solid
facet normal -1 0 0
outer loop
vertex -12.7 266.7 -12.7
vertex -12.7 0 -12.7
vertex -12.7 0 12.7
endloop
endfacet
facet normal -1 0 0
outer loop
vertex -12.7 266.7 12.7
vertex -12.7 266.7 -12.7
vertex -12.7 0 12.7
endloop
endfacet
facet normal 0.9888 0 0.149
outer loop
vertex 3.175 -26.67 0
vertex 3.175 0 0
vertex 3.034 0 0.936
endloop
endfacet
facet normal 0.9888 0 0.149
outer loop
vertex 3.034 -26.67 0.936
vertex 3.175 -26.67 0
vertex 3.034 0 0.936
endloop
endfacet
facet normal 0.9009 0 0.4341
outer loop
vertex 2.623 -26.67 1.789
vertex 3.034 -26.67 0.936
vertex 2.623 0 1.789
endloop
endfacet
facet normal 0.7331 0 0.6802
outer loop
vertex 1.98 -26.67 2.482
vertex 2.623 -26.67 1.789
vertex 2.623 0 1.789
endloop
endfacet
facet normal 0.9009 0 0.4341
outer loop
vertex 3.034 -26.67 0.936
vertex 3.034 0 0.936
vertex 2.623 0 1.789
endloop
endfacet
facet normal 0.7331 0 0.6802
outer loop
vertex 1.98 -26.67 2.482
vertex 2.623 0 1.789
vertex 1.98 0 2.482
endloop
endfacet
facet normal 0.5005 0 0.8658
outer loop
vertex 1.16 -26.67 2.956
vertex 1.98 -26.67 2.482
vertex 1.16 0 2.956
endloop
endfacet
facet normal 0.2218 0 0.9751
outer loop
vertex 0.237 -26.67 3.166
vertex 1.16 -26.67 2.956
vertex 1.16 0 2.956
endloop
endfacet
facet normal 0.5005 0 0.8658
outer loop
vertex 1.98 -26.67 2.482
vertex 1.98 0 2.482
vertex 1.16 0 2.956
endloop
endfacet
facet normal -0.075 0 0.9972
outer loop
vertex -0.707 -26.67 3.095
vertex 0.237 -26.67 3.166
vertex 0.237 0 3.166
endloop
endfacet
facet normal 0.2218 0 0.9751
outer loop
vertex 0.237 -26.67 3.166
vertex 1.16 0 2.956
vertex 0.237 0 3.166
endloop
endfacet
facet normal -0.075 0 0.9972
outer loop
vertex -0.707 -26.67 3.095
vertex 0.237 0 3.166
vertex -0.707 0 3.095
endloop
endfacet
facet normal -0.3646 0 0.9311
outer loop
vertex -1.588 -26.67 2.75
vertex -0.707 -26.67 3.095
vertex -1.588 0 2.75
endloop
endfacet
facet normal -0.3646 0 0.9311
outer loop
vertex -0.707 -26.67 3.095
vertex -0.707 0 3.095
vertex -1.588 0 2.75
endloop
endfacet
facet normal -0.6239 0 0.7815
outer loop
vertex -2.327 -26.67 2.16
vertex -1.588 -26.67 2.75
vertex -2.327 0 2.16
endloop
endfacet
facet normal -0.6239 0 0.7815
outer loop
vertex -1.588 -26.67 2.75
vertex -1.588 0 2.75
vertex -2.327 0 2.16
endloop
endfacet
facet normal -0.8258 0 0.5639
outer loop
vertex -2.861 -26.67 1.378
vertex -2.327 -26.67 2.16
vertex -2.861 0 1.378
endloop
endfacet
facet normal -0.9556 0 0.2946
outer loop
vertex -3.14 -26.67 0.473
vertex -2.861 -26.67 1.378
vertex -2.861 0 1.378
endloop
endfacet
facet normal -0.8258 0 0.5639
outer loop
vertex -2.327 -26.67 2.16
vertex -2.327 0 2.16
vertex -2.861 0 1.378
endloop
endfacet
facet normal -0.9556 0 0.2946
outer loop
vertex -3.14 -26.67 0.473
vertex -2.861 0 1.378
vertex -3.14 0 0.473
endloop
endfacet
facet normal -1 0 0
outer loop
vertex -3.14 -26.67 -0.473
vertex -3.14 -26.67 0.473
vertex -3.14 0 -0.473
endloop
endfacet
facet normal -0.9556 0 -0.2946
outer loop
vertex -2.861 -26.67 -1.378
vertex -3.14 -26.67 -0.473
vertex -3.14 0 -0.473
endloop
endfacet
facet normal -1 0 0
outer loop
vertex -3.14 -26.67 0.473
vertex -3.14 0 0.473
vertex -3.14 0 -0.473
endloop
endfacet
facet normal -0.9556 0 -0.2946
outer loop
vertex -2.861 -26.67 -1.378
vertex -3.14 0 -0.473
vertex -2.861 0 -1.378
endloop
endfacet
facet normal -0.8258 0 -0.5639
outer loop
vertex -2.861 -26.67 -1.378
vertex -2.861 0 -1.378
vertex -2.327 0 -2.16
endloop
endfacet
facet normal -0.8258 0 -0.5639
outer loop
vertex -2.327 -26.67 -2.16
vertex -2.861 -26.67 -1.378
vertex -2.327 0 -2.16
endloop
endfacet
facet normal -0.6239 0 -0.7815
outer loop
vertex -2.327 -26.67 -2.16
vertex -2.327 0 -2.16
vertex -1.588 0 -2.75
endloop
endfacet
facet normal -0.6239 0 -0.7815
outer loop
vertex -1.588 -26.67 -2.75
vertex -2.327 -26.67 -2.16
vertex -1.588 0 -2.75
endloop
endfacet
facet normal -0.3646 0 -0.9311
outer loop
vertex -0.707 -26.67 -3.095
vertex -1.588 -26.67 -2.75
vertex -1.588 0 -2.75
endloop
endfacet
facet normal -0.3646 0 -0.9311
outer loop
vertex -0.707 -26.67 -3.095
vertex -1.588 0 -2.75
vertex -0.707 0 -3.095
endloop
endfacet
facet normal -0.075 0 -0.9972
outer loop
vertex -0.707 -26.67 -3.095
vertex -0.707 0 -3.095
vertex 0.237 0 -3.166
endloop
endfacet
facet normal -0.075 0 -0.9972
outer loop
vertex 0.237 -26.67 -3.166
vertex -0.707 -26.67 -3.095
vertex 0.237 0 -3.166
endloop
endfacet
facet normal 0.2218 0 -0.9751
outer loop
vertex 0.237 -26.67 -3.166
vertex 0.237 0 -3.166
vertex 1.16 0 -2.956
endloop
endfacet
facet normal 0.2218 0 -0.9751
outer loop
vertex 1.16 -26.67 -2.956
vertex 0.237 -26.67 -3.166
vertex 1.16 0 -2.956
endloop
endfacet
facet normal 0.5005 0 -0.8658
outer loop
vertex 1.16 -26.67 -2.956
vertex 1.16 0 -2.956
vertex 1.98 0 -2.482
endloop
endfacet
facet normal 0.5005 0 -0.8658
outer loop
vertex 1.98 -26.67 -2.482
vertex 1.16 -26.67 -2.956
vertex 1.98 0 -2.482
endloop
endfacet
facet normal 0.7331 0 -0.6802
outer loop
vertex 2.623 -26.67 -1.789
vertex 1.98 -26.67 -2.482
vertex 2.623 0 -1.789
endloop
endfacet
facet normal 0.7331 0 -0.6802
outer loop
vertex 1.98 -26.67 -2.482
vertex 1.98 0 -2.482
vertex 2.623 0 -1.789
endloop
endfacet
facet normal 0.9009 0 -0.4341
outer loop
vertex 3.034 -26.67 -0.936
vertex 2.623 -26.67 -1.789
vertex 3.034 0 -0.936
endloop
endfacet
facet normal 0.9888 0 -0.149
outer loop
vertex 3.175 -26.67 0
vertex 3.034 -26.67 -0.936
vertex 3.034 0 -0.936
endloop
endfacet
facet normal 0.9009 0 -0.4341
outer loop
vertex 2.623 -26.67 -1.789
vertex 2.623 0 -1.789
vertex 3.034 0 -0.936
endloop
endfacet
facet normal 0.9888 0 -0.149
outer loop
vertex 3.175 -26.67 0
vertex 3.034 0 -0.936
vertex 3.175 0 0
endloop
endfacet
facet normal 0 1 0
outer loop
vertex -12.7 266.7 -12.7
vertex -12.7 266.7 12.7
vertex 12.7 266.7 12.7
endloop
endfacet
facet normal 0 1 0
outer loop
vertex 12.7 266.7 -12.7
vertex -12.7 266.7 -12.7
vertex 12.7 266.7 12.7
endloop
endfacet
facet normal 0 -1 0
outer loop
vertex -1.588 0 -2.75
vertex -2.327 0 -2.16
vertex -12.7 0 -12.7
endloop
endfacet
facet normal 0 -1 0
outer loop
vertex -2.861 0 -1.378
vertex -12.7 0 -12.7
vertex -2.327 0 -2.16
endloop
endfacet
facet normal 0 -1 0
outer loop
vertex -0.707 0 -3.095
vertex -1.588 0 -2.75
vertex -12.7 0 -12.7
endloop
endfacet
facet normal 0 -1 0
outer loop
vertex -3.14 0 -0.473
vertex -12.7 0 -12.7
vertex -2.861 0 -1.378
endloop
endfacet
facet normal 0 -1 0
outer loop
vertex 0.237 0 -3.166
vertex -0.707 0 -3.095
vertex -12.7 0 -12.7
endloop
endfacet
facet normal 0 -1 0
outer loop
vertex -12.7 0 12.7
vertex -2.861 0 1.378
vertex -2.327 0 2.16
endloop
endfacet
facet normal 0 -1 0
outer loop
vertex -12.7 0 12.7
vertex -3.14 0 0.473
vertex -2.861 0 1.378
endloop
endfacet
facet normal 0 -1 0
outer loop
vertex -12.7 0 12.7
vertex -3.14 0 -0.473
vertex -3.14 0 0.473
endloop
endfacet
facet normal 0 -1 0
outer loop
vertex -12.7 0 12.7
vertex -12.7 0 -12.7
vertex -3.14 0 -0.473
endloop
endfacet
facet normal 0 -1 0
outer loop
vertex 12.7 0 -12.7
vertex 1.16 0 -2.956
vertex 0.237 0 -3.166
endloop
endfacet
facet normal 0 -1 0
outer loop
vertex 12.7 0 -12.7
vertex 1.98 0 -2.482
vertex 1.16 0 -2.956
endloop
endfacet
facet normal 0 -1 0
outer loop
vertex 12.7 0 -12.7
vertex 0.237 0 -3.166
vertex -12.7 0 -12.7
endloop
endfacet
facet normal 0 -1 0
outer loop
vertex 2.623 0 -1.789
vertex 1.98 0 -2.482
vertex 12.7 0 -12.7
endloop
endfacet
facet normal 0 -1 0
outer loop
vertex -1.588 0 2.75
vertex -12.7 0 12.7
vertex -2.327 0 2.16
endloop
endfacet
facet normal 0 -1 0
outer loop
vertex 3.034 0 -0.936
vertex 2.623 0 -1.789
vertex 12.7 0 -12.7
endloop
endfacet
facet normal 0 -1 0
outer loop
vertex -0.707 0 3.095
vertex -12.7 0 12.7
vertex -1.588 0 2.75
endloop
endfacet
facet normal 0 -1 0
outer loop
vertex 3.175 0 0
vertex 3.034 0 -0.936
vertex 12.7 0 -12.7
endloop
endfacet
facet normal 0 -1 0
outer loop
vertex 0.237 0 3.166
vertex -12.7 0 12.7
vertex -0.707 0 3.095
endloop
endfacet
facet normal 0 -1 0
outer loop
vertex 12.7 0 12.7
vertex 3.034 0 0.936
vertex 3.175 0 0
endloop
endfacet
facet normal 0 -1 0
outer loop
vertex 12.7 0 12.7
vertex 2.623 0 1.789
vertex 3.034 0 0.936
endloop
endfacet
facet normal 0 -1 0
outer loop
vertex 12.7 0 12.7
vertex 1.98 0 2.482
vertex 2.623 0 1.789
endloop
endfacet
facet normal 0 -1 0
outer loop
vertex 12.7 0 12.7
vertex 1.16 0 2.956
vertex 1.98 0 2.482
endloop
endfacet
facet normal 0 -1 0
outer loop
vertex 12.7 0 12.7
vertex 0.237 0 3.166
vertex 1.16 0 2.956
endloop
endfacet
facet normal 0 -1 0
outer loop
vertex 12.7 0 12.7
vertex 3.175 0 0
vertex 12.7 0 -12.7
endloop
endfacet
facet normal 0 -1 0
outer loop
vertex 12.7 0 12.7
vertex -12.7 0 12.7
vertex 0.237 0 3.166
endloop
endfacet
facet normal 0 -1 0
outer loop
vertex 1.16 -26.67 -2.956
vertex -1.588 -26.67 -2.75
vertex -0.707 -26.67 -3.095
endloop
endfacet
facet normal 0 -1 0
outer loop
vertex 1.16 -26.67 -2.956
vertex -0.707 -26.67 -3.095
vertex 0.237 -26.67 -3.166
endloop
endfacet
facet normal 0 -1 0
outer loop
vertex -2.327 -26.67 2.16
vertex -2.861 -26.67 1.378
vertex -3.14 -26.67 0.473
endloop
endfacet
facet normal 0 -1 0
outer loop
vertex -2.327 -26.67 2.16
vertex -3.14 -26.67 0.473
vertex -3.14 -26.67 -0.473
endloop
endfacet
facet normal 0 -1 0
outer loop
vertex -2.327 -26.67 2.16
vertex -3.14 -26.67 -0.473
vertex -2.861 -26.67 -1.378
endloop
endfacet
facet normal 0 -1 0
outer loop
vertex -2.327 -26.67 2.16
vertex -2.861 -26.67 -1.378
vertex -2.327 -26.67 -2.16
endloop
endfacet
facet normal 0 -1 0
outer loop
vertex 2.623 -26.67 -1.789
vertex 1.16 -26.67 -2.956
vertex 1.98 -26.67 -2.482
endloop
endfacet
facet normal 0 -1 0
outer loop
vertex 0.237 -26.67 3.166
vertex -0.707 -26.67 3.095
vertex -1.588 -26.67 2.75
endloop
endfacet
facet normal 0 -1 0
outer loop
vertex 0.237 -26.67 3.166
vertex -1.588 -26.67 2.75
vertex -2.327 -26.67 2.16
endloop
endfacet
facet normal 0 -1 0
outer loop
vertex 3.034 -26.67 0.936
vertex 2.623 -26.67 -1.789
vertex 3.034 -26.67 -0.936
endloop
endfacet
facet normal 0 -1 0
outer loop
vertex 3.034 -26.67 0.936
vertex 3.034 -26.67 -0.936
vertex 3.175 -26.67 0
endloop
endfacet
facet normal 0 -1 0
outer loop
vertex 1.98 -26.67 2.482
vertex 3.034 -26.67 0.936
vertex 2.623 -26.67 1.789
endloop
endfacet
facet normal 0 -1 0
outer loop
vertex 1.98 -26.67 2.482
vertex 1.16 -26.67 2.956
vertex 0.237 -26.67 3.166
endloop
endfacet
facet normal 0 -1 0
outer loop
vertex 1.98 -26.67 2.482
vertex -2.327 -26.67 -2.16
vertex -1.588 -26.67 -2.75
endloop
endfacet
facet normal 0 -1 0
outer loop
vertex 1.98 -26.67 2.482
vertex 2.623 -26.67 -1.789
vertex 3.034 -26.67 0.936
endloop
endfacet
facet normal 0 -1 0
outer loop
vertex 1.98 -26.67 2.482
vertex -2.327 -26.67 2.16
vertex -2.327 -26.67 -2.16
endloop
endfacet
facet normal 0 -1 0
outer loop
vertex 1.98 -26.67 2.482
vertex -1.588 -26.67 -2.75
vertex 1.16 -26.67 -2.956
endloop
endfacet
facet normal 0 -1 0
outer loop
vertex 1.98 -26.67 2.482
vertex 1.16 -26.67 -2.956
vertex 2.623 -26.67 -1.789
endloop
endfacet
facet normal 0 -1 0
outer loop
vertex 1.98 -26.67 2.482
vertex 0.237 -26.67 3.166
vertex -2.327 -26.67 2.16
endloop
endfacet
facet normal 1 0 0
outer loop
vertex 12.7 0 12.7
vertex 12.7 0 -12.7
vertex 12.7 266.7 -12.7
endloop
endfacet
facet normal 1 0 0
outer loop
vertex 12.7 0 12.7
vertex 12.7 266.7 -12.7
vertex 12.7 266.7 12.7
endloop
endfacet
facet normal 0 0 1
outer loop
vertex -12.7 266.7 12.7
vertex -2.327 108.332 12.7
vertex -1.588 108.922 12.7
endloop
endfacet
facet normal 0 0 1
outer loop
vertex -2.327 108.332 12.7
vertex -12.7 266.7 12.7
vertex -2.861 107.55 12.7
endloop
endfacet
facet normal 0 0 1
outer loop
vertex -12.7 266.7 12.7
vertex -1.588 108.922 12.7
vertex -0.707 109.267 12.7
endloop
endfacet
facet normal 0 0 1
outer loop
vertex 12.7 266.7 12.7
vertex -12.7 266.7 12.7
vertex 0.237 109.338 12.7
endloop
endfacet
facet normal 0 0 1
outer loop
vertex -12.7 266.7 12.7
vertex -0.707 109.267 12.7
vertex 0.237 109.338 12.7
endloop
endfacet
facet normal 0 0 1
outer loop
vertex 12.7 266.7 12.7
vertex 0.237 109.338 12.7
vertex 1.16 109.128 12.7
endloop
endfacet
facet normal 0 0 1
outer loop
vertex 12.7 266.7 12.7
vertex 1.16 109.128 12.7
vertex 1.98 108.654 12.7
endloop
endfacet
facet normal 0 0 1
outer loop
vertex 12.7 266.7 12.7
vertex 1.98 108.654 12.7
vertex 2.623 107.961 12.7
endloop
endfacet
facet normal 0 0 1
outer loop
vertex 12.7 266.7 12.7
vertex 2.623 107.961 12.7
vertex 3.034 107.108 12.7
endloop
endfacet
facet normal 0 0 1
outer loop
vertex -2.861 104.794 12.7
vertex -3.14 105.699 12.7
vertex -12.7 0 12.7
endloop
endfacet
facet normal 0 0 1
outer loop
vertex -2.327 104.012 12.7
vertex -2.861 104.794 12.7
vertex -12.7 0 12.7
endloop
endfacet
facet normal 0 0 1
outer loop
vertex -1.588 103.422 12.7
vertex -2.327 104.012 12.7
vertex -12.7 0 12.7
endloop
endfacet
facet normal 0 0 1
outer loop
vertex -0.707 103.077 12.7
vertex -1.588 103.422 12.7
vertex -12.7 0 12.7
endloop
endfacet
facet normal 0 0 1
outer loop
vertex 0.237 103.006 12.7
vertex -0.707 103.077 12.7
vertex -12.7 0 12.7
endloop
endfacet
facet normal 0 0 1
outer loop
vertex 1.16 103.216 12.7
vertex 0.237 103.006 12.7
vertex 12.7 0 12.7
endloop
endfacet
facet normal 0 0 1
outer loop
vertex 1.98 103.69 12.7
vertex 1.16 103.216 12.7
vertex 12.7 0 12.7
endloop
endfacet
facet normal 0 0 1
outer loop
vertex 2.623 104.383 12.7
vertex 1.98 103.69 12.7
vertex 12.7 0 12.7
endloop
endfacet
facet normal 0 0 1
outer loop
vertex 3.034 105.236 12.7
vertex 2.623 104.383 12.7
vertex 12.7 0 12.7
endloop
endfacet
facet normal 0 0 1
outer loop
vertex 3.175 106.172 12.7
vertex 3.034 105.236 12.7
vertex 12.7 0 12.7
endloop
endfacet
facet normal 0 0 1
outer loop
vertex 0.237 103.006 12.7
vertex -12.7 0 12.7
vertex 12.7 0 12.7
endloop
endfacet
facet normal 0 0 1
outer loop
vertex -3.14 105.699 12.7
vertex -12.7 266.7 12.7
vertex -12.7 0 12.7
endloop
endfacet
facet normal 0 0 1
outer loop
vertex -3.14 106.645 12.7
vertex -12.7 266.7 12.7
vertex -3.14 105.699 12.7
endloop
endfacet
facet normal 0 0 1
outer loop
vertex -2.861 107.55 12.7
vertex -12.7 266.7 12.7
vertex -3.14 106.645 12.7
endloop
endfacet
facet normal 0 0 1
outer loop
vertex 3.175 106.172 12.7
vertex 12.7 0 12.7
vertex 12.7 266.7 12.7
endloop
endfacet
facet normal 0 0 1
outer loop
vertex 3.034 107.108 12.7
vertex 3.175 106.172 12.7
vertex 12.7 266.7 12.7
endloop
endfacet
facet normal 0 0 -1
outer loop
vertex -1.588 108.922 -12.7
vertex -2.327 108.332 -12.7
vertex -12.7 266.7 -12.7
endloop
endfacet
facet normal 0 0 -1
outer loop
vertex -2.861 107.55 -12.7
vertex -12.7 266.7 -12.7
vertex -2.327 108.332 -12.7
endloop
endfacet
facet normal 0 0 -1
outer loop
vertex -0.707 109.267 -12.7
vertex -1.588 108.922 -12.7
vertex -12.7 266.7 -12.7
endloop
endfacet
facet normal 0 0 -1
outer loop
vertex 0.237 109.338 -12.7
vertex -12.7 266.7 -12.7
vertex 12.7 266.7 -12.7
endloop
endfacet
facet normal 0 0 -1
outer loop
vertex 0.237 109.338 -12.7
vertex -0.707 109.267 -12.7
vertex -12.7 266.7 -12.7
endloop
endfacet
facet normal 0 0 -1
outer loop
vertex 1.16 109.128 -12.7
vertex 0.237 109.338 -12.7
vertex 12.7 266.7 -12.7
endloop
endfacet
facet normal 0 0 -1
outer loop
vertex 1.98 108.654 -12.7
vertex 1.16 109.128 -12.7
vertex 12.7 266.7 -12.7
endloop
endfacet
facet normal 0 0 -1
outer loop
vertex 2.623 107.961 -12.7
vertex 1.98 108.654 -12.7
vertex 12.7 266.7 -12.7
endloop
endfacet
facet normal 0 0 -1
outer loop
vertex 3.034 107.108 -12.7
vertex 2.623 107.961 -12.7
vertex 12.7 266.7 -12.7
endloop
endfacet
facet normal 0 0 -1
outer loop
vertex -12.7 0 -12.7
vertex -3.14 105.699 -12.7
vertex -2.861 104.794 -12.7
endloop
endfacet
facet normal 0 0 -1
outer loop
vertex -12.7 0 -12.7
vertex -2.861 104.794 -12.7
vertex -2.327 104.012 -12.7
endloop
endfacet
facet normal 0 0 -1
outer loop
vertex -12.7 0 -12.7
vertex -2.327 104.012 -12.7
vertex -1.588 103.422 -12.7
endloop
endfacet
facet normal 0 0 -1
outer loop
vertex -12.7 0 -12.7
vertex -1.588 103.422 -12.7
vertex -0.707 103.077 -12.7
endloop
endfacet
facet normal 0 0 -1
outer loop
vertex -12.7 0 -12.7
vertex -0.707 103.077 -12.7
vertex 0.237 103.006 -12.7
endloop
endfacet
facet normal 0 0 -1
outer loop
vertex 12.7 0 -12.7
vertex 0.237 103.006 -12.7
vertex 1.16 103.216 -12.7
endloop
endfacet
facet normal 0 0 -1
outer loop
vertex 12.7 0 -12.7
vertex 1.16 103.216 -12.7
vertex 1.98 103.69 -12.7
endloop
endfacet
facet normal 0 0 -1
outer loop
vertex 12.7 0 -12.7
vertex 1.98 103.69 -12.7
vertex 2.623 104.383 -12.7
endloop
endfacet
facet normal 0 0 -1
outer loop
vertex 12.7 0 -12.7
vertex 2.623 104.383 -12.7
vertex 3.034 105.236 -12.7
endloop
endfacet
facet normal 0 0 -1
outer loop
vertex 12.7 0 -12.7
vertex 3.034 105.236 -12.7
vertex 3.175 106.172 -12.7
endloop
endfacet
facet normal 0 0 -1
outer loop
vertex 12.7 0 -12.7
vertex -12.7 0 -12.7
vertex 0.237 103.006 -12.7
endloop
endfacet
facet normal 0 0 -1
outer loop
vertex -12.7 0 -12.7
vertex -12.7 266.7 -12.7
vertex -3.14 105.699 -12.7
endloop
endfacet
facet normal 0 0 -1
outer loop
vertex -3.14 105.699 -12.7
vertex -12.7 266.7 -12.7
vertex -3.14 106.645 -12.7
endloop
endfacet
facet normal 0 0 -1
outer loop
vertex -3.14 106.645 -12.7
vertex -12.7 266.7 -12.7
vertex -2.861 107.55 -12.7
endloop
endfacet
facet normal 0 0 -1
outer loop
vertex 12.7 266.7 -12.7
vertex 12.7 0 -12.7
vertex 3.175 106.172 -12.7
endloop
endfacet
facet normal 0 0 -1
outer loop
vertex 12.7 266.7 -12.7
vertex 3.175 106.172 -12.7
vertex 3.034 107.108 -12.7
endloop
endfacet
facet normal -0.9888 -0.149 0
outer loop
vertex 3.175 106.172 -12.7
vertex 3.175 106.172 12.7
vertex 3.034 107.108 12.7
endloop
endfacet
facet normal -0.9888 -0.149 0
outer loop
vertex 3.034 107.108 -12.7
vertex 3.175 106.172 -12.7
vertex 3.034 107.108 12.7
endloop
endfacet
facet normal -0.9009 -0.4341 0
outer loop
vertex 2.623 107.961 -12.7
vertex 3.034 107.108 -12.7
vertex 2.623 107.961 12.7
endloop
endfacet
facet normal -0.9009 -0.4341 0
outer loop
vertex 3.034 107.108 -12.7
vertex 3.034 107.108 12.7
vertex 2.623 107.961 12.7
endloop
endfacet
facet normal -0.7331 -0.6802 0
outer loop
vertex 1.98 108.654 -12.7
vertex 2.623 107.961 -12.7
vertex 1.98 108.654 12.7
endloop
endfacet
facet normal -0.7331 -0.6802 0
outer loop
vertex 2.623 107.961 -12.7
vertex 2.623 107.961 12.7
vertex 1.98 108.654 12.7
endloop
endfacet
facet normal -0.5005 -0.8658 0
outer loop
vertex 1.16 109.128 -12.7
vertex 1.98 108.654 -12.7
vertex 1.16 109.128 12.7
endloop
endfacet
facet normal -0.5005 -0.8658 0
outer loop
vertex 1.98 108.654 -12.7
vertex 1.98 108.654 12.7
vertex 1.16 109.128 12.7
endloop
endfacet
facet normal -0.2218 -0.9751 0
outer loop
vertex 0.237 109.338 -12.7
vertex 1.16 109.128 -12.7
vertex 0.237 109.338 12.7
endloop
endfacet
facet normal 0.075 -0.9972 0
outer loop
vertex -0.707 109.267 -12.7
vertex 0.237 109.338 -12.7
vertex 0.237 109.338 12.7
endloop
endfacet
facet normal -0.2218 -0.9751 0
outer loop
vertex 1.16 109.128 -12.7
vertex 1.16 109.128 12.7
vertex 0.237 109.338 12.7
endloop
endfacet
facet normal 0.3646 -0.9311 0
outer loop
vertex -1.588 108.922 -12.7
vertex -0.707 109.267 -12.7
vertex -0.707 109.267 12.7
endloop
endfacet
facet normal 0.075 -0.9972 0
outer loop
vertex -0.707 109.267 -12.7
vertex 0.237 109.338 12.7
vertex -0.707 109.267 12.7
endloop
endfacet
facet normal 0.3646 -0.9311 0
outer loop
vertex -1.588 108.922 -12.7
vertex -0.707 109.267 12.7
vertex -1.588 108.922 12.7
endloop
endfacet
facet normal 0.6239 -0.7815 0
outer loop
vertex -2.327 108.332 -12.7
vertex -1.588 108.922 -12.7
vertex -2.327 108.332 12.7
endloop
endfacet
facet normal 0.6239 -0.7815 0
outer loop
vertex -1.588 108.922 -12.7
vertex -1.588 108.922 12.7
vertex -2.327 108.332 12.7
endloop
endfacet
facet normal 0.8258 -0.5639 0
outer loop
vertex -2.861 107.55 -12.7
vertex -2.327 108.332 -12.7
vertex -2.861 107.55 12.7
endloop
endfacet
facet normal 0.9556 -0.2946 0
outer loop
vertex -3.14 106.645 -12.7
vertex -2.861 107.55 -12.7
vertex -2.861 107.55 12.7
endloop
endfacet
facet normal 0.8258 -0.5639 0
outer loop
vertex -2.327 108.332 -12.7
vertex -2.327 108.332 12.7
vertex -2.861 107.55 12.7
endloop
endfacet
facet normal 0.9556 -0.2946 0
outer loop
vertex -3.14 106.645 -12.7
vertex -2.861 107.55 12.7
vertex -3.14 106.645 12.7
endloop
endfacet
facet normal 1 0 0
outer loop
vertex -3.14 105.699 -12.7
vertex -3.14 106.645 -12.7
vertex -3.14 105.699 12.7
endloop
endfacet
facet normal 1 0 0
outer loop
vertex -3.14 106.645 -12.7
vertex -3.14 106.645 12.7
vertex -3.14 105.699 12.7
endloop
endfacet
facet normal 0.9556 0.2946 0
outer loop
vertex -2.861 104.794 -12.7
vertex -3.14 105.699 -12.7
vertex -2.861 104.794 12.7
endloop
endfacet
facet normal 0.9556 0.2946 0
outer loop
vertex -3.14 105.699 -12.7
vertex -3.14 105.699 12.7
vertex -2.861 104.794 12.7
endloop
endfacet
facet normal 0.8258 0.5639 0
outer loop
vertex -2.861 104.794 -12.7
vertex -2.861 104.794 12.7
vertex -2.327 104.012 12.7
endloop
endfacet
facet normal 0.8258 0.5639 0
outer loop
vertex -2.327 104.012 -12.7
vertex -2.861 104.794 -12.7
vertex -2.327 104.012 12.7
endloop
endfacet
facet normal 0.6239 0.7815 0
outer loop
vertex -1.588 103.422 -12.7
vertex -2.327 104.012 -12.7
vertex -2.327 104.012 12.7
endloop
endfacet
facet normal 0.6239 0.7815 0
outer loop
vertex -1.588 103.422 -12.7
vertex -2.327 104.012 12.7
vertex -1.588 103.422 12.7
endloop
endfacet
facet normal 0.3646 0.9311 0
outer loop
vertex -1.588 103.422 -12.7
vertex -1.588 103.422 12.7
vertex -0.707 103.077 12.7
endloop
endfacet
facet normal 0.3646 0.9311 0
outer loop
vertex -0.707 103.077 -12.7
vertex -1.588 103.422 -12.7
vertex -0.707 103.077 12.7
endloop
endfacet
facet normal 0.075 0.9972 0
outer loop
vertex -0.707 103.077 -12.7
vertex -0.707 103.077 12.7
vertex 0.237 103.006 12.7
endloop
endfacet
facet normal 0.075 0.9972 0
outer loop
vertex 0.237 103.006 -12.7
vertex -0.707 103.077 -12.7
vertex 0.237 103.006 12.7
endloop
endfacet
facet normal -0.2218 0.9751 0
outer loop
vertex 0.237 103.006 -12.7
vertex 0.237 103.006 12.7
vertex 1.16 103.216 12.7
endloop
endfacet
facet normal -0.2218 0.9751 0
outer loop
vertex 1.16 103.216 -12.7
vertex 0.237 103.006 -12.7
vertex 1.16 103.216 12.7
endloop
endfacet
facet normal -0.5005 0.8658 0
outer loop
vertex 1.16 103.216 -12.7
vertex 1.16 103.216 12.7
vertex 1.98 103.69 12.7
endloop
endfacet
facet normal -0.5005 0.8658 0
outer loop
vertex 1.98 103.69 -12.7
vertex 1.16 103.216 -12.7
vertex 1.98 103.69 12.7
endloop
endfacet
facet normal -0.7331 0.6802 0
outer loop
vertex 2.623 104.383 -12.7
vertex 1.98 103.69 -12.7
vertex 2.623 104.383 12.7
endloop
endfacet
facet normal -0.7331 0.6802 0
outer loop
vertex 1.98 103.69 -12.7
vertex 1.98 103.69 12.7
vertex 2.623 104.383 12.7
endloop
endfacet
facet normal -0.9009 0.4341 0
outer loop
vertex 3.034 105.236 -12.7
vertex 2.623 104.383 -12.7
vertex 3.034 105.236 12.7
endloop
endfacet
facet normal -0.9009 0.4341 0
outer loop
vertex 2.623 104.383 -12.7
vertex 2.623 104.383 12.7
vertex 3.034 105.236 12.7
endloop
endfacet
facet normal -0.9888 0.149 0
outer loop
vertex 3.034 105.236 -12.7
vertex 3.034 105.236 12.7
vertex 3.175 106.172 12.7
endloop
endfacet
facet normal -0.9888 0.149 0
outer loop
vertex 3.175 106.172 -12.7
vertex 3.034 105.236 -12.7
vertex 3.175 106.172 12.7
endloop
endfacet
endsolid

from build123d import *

# Parameters (mm, degrees)
F0_W     = 25.4
F0_H     = 25.4
F1_DEPTH = 266.7
F2_R     = 3.175
F3_DEPTH = 26.67
F4_R     = 3.175
F5_DEPTH = 25.4


with BuildPart() as f1:
    # F0 (on Front) → F1 (new body)
    with BuildSketch(Plane.XZ):
        Rectangle(F0_W, F0_H)
    extrude(amount=-F1_DEPTH)

    # F2 (on face) → F3 (join)
    with BuildSketch(Plane.XZ):
        Circle(F2_R)
    extrude(amount=F3_DEPTH)

    # F4 (on face) → F5 (cut, through all)
    with BuildSketch(Plane.XY.offset(12.7)):
        with Locations((0, 106.172)):
            Circle(F4_R)
    extrude(amount=-F5_DEPTH, mode=Mode.SUBTRACT)


solid = f1.part
